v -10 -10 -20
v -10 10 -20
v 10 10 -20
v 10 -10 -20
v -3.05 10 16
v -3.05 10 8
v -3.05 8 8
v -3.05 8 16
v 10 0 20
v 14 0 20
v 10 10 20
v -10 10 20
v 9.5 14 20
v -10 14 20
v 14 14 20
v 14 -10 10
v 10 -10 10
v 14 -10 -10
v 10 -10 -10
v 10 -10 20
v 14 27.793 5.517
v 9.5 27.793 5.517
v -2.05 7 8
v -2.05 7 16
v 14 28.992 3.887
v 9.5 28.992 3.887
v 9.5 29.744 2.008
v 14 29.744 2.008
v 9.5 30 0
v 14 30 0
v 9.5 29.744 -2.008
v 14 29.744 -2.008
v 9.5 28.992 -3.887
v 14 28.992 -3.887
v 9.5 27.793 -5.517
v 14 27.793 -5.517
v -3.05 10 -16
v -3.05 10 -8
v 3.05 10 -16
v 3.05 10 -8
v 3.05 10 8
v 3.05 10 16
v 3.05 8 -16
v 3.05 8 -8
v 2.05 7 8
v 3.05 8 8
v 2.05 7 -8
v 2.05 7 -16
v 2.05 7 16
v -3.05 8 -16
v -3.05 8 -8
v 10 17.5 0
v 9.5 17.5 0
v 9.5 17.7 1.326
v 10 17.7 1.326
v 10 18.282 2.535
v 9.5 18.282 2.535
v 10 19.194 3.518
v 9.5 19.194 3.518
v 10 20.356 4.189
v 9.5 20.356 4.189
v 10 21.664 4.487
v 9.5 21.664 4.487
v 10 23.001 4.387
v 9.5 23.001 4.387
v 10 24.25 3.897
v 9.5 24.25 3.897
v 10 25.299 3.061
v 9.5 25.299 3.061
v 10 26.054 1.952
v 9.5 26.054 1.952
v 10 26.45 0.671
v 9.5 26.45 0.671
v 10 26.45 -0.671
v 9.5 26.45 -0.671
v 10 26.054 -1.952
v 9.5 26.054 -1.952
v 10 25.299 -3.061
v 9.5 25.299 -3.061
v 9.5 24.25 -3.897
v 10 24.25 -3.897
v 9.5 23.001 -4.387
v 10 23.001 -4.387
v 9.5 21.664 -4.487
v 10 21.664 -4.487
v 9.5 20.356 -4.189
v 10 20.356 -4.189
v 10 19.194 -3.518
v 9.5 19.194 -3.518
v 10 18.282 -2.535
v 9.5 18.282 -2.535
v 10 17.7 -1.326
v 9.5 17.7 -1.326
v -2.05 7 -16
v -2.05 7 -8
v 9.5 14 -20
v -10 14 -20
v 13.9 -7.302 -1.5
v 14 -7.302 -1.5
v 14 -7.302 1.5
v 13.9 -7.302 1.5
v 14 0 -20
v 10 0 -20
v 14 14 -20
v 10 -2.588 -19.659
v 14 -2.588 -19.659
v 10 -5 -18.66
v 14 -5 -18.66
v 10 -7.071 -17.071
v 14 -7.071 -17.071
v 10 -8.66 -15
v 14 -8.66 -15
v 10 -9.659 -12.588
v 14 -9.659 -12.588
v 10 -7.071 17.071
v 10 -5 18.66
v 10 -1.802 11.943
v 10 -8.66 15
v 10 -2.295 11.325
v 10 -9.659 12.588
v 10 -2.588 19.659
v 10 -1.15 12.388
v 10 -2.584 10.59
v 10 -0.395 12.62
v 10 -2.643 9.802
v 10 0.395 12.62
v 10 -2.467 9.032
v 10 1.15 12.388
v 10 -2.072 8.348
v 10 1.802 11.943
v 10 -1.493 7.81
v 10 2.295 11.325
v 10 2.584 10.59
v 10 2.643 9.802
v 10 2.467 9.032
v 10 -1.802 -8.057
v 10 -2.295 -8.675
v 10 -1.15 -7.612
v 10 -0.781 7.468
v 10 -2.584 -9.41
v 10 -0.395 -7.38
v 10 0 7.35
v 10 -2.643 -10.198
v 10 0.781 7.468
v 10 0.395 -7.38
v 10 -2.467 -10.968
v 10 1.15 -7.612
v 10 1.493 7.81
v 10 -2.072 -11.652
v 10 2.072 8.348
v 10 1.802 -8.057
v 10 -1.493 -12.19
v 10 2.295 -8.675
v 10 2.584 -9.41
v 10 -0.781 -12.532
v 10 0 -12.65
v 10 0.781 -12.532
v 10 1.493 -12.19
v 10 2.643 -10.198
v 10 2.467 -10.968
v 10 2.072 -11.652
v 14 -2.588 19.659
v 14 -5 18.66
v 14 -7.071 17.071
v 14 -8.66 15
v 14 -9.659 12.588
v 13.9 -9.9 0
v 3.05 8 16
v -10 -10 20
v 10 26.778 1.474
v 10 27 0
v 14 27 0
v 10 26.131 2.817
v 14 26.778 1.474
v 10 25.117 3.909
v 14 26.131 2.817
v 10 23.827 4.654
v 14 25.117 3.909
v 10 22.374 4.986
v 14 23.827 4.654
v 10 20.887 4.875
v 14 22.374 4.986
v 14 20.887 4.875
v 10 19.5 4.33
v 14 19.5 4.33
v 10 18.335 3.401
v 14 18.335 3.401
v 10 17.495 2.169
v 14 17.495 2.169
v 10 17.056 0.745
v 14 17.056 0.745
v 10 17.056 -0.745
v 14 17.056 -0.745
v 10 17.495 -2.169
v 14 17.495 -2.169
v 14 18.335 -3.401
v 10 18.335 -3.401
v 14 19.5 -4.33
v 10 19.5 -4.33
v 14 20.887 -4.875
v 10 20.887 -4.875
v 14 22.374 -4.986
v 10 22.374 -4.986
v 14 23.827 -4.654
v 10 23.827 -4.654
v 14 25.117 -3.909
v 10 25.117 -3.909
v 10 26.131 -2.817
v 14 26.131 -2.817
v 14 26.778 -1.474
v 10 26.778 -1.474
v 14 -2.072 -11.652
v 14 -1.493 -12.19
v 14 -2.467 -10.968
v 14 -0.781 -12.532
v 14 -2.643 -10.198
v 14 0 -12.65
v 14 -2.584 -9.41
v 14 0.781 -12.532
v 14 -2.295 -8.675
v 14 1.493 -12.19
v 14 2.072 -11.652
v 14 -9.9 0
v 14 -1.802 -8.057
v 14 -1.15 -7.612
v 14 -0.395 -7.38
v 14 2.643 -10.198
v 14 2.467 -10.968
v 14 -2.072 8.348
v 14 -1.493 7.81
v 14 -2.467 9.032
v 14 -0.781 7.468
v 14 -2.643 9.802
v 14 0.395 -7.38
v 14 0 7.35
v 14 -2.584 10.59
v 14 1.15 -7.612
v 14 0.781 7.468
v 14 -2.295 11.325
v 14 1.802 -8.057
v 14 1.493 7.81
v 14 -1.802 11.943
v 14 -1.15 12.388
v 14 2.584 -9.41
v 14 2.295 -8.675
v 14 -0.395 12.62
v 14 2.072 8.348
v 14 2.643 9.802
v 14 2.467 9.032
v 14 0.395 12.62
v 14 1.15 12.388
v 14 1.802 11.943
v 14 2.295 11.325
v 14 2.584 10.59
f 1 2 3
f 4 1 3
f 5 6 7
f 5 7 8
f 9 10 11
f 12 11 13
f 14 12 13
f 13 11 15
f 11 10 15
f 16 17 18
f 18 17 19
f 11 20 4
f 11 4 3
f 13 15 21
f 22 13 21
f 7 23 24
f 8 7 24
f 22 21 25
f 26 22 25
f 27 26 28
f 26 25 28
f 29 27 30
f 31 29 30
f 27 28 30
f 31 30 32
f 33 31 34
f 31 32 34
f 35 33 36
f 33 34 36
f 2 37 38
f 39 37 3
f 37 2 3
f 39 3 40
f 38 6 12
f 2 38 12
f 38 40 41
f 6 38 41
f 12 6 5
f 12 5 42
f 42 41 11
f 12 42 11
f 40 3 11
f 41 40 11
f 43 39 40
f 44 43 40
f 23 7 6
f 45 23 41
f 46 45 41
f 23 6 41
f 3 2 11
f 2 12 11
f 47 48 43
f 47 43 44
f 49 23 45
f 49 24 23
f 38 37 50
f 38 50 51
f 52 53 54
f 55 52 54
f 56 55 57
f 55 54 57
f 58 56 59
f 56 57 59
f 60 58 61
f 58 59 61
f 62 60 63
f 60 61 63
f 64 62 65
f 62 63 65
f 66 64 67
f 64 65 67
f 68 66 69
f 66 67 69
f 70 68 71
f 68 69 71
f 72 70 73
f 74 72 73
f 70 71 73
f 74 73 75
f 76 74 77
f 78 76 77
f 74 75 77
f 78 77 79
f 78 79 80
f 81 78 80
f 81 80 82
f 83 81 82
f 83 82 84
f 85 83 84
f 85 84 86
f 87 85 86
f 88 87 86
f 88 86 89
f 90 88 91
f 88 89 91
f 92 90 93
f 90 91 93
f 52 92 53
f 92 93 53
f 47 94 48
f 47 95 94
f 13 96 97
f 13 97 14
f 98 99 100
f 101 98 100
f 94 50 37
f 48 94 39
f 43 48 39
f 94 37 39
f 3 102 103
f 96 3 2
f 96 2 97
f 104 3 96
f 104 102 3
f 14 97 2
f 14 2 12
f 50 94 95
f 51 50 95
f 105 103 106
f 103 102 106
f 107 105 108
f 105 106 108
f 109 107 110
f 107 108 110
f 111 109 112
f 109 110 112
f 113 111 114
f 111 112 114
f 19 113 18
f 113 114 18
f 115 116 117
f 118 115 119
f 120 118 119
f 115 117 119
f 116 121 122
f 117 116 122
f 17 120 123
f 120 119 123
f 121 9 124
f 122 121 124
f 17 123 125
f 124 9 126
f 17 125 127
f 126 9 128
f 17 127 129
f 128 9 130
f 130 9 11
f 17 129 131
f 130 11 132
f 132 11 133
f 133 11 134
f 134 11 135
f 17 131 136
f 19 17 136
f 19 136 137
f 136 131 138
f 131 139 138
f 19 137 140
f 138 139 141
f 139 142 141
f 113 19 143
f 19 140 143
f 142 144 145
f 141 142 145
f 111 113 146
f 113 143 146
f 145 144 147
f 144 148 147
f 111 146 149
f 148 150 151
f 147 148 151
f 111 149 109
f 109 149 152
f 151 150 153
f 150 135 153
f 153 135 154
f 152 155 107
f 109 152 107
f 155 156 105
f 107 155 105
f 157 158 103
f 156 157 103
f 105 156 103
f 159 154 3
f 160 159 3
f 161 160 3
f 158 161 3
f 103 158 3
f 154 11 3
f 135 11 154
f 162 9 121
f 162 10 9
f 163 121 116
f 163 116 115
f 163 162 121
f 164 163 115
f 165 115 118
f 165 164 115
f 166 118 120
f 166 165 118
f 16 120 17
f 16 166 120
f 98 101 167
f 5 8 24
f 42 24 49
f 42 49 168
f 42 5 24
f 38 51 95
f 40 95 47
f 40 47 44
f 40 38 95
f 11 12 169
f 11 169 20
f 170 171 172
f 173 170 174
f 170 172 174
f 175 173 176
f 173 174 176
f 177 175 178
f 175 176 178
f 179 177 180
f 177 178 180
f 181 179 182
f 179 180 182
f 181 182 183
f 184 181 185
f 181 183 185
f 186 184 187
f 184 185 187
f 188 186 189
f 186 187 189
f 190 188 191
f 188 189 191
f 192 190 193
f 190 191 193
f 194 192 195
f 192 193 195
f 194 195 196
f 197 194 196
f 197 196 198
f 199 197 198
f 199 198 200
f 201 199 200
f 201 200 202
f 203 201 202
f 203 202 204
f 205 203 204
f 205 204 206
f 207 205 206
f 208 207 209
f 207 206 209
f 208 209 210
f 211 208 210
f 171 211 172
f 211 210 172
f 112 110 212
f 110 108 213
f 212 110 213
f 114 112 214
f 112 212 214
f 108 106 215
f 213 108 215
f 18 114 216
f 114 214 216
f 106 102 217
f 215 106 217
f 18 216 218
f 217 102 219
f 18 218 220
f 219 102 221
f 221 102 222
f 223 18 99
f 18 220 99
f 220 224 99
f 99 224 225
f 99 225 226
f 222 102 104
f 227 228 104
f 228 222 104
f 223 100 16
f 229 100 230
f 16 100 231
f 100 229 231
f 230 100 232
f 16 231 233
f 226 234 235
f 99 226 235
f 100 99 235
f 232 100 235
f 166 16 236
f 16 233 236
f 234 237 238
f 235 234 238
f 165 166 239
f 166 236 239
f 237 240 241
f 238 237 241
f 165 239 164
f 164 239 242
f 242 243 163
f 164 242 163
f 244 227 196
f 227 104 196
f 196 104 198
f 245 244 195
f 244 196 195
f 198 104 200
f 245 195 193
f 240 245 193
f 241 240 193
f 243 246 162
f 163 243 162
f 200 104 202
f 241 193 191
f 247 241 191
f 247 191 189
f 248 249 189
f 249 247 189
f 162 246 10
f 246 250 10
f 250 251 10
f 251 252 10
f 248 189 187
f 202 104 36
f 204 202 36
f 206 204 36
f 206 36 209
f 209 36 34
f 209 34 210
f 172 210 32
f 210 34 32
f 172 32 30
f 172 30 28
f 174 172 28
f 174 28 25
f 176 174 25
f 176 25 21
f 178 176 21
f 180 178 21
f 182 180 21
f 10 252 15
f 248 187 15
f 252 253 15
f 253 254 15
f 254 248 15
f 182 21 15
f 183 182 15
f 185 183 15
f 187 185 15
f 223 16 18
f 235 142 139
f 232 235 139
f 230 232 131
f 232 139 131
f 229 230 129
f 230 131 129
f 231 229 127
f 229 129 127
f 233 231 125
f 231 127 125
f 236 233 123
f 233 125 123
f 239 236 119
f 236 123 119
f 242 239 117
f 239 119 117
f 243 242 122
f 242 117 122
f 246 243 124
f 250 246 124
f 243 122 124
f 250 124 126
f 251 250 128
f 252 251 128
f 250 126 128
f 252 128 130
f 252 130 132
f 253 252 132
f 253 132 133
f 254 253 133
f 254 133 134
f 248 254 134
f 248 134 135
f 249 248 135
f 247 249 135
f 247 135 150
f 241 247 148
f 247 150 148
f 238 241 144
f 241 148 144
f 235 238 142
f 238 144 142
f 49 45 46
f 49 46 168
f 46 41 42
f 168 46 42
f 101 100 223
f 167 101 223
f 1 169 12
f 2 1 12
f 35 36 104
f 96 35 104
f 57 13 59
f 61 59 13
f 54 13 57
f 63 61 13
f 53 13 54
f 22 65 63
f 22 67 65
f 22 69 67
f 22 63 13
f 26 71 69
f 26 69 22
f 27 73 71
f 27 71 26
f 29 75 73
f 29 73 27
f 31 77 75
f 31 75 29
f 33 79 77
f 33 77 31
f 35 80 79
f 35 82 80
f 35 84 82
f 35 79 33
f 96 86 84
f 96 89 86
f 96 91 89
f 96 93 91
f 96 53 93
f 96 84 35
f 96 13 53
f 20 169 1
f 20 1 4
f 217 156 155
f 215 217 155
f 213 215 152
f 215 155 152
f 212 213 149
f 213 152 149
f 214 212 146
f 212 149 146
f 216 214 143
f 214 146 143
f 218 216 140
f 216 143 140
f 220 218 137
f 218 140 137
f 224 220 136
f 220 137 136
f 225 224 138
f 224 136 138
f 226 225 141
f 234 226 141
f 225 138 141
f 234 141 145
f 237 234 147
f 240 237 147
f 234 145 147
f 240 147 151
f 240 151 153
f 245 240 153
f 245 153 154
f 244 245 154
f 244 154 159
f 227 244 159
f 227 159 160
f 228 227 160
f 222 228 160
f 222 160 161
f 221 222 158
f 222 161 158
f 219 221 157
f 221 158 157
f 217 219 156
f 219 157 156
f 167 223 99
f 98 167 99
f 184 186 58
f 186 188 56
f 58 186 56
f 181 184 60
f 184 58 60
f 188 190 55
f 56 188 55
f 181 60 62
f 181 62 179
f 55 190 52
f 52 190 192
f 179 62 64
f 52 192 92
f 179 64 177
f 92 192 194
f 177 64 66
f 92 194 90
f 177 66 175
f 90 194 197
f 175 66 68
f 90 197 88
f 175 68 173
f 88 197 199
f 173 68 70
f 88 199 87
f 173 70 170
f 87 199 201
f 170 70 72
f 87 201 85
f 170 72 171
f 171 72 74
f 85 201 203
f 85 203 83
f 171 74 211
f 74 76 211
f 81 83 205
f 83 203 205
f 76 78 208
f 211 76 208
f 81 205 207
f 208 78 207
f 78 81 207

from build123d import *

# Parameters (mm, degrees)
SKETCH_2_W                 = 20
SKETCH_2_H                 = 20
EXTRUDE_1_DEPTH            = 20
SKETCH_3_W                 = 40
SKETCH_3_H                 = 24
EXTRUDE_2_DEPTH            = 4
SKETCH_5_W                 = 2.65
SKETCH_5_H                 = 24
HOLE_WIZARD_M51_AT_2_COUNT = 2
HOLE_WIZARD_M51_AT_2_PITCH = 20
SKETCH_6_W                 = 40
SKETCH_6_H                 = 4
EXTRUDE_3_DEPTH            = 20
SKETCH_7_W                 = 6.1
SKETCH_7_H                 = 8
EXTRUDE_4_DEPTH            = 3
CHAMFER_1_SIZE             = 1
SKETCH_8_R                 = 5
EXTRUDE_5_DEPTH            = 4.5
SKETCH_9_R                 = 5
SKETCH_9_R_2               = 4.5
EXTRUDE_6_DEPTH            = 0.5
FILLET_1_R                 = 10
CUT_EXTRUDE_2_DEPTH        = 0.1


with BuildPart() as part:
    # Эскиз2 → Бобышка-Вытянуть1 (new, symmetric)
    with BuildSketch(Plane.XY):
        Rectangle(SKETCH_2_W, SKETCH_2_H)
    extrude(amount=EXTRUDE_1_DEPTH, both=True)


with BuildPart() as body_2:
    # Эскиз3 → Бобышка-Вытянуть2 (new body)
    with BuildSketch(Plane(origin=(10, 0, 0), x_dir=(0, 0, -1), z_dir=(1, 0, 0))):
        with Locations((0, 2)):
            Rectangle(SKETCH_3_W, SKETCH_3_H)
    extrude(amount=EXTRUDE_2_DEPTH)

    # Эскиз5 → Отверстие с зазором M51 (revolve, cut)
    with BuildSketch(Plane(origin=(14, 0, 10), x_dir=(0, 0, -1), z_dir=(0, 1, 0))):
        with Locations((1.325, 12)):
            Rectangle(SKETCH_5_W, SKETCH_5_H)
    hole_wizard_m51 = revolve(axis=Axis((20.35, 0, 10), (-1, 0, 0)), mode=Mode.SUBTRACT)

    # Отверстие с зазором M51 at 2: Отверстие с зазором M51 ×2
    with Locations(*[(0, 0, -i * HOLE_WIZARD_M51_AT_2_PITCH) for i in range(1, HOLE_WIZARD_M51_AT_2_COUNT)]):
        add(hole_wizard_m51, mode=Mode.SUBTRACT)

    # Эскиз6 → Бобышка-Вытянуть3 (add)
    with BuildSketch(Plane.ZY.offset(-10)):
        with Locations((0, 12)):
            Rectangle(SKETCH_6_W, SKETCH_6_H)
    extrude(amount=EXTRUDE_3_DEPTH)

    # Эскиз7 → Бобышка-Вытянуть4 (add)
    with BuildSketch(Plane.XZ.offset(-10)):
        with Locations((0, 12)):
            Rectangle(SKETCH_7_W, SKETCH_7_H)
        with Locations((0, -12)):
            Rectangle(SKETCH_7_W, SKETCH_7_H)
    extrude(amount=EXTRUDE_4_DEPTH)

    # Фаска1
    chamfer_1_edges = [body_2.edges().sort_by_distance(p)[0] for p in [
        (-3.05, 7, 12),
        (3.05, 7, 12),
        (-3.05, 7, -12),
        (3.05, 7, -12),
    ]]
    chamfer(chamfer_1_edges, length=CHAMFER_1_SIZE)

    # Эскиз8 → Бобышка-Вытянуть5 (add)
    with BuildSketch(Plane(origin=(14, 0, 0), x_dir=(0, 0, -1), z_dir=(1, 0, 0))):
        with BuildLine():
            ThreePointArc((-5.517241379, 27.793103448), (0, 30), (5.517241379, 27.793103448))
            Line((5.517241379, 27.793103448), (20, 14))
            Line((20, 14), (-20, 14))
            Line((-20, 14), (-5.517241379, 27.793103448))
        make_face()
        with Locations(Location((0, 22, 0), (0, 0, 90))):
            Circle(SKETCH_8_R, mode=Mode.SUBTRACT)
    extrude(amount=-EXTRUDE_5_DEPTH)

    # Эскиз9 → Бобышка-Вытянуть6 (add)
    with BuildSketch(Plane.ZY.offset(-9.5)):
        with Locations(Location((0, 22, 0), (0, 0, 90))):
            Circle(SKETCH_9_R)
        with Locations(Location((0, 22, 0), (0, 0, 270))):
            Circle(SKETCH_9_R_2, mode=Mode.SUBTRACT)
    extrude(amount=-EXTRUDE_6_DEPTH)

    # Скругление1
    fillet_1_edges = [body_2.edges().sort_by_distance(p)[0] for p in [
        (12, -10, -20),
        (12, -10, 20),
    ]]
    fillet(fillet_1_edges, radius=FILLET_1_R)

    # Эскиз10 → Вырез-Вытянуть2 (cut)
    with BuildSketch(Plane(origin=(14, 0, 0), x_dir=(0, 0, -1), z_dir=(1, 0, 0))):
        Polygon((0, -9.9), (1.5, -7.301923789), (-1.5, -7.301923789), align=None)
    extrude(amount=-CUT_EXTRUDE_2_DEPTH, mode=Mode.SUBTRACT)


solid = Compound([part.part, body_2.part])
